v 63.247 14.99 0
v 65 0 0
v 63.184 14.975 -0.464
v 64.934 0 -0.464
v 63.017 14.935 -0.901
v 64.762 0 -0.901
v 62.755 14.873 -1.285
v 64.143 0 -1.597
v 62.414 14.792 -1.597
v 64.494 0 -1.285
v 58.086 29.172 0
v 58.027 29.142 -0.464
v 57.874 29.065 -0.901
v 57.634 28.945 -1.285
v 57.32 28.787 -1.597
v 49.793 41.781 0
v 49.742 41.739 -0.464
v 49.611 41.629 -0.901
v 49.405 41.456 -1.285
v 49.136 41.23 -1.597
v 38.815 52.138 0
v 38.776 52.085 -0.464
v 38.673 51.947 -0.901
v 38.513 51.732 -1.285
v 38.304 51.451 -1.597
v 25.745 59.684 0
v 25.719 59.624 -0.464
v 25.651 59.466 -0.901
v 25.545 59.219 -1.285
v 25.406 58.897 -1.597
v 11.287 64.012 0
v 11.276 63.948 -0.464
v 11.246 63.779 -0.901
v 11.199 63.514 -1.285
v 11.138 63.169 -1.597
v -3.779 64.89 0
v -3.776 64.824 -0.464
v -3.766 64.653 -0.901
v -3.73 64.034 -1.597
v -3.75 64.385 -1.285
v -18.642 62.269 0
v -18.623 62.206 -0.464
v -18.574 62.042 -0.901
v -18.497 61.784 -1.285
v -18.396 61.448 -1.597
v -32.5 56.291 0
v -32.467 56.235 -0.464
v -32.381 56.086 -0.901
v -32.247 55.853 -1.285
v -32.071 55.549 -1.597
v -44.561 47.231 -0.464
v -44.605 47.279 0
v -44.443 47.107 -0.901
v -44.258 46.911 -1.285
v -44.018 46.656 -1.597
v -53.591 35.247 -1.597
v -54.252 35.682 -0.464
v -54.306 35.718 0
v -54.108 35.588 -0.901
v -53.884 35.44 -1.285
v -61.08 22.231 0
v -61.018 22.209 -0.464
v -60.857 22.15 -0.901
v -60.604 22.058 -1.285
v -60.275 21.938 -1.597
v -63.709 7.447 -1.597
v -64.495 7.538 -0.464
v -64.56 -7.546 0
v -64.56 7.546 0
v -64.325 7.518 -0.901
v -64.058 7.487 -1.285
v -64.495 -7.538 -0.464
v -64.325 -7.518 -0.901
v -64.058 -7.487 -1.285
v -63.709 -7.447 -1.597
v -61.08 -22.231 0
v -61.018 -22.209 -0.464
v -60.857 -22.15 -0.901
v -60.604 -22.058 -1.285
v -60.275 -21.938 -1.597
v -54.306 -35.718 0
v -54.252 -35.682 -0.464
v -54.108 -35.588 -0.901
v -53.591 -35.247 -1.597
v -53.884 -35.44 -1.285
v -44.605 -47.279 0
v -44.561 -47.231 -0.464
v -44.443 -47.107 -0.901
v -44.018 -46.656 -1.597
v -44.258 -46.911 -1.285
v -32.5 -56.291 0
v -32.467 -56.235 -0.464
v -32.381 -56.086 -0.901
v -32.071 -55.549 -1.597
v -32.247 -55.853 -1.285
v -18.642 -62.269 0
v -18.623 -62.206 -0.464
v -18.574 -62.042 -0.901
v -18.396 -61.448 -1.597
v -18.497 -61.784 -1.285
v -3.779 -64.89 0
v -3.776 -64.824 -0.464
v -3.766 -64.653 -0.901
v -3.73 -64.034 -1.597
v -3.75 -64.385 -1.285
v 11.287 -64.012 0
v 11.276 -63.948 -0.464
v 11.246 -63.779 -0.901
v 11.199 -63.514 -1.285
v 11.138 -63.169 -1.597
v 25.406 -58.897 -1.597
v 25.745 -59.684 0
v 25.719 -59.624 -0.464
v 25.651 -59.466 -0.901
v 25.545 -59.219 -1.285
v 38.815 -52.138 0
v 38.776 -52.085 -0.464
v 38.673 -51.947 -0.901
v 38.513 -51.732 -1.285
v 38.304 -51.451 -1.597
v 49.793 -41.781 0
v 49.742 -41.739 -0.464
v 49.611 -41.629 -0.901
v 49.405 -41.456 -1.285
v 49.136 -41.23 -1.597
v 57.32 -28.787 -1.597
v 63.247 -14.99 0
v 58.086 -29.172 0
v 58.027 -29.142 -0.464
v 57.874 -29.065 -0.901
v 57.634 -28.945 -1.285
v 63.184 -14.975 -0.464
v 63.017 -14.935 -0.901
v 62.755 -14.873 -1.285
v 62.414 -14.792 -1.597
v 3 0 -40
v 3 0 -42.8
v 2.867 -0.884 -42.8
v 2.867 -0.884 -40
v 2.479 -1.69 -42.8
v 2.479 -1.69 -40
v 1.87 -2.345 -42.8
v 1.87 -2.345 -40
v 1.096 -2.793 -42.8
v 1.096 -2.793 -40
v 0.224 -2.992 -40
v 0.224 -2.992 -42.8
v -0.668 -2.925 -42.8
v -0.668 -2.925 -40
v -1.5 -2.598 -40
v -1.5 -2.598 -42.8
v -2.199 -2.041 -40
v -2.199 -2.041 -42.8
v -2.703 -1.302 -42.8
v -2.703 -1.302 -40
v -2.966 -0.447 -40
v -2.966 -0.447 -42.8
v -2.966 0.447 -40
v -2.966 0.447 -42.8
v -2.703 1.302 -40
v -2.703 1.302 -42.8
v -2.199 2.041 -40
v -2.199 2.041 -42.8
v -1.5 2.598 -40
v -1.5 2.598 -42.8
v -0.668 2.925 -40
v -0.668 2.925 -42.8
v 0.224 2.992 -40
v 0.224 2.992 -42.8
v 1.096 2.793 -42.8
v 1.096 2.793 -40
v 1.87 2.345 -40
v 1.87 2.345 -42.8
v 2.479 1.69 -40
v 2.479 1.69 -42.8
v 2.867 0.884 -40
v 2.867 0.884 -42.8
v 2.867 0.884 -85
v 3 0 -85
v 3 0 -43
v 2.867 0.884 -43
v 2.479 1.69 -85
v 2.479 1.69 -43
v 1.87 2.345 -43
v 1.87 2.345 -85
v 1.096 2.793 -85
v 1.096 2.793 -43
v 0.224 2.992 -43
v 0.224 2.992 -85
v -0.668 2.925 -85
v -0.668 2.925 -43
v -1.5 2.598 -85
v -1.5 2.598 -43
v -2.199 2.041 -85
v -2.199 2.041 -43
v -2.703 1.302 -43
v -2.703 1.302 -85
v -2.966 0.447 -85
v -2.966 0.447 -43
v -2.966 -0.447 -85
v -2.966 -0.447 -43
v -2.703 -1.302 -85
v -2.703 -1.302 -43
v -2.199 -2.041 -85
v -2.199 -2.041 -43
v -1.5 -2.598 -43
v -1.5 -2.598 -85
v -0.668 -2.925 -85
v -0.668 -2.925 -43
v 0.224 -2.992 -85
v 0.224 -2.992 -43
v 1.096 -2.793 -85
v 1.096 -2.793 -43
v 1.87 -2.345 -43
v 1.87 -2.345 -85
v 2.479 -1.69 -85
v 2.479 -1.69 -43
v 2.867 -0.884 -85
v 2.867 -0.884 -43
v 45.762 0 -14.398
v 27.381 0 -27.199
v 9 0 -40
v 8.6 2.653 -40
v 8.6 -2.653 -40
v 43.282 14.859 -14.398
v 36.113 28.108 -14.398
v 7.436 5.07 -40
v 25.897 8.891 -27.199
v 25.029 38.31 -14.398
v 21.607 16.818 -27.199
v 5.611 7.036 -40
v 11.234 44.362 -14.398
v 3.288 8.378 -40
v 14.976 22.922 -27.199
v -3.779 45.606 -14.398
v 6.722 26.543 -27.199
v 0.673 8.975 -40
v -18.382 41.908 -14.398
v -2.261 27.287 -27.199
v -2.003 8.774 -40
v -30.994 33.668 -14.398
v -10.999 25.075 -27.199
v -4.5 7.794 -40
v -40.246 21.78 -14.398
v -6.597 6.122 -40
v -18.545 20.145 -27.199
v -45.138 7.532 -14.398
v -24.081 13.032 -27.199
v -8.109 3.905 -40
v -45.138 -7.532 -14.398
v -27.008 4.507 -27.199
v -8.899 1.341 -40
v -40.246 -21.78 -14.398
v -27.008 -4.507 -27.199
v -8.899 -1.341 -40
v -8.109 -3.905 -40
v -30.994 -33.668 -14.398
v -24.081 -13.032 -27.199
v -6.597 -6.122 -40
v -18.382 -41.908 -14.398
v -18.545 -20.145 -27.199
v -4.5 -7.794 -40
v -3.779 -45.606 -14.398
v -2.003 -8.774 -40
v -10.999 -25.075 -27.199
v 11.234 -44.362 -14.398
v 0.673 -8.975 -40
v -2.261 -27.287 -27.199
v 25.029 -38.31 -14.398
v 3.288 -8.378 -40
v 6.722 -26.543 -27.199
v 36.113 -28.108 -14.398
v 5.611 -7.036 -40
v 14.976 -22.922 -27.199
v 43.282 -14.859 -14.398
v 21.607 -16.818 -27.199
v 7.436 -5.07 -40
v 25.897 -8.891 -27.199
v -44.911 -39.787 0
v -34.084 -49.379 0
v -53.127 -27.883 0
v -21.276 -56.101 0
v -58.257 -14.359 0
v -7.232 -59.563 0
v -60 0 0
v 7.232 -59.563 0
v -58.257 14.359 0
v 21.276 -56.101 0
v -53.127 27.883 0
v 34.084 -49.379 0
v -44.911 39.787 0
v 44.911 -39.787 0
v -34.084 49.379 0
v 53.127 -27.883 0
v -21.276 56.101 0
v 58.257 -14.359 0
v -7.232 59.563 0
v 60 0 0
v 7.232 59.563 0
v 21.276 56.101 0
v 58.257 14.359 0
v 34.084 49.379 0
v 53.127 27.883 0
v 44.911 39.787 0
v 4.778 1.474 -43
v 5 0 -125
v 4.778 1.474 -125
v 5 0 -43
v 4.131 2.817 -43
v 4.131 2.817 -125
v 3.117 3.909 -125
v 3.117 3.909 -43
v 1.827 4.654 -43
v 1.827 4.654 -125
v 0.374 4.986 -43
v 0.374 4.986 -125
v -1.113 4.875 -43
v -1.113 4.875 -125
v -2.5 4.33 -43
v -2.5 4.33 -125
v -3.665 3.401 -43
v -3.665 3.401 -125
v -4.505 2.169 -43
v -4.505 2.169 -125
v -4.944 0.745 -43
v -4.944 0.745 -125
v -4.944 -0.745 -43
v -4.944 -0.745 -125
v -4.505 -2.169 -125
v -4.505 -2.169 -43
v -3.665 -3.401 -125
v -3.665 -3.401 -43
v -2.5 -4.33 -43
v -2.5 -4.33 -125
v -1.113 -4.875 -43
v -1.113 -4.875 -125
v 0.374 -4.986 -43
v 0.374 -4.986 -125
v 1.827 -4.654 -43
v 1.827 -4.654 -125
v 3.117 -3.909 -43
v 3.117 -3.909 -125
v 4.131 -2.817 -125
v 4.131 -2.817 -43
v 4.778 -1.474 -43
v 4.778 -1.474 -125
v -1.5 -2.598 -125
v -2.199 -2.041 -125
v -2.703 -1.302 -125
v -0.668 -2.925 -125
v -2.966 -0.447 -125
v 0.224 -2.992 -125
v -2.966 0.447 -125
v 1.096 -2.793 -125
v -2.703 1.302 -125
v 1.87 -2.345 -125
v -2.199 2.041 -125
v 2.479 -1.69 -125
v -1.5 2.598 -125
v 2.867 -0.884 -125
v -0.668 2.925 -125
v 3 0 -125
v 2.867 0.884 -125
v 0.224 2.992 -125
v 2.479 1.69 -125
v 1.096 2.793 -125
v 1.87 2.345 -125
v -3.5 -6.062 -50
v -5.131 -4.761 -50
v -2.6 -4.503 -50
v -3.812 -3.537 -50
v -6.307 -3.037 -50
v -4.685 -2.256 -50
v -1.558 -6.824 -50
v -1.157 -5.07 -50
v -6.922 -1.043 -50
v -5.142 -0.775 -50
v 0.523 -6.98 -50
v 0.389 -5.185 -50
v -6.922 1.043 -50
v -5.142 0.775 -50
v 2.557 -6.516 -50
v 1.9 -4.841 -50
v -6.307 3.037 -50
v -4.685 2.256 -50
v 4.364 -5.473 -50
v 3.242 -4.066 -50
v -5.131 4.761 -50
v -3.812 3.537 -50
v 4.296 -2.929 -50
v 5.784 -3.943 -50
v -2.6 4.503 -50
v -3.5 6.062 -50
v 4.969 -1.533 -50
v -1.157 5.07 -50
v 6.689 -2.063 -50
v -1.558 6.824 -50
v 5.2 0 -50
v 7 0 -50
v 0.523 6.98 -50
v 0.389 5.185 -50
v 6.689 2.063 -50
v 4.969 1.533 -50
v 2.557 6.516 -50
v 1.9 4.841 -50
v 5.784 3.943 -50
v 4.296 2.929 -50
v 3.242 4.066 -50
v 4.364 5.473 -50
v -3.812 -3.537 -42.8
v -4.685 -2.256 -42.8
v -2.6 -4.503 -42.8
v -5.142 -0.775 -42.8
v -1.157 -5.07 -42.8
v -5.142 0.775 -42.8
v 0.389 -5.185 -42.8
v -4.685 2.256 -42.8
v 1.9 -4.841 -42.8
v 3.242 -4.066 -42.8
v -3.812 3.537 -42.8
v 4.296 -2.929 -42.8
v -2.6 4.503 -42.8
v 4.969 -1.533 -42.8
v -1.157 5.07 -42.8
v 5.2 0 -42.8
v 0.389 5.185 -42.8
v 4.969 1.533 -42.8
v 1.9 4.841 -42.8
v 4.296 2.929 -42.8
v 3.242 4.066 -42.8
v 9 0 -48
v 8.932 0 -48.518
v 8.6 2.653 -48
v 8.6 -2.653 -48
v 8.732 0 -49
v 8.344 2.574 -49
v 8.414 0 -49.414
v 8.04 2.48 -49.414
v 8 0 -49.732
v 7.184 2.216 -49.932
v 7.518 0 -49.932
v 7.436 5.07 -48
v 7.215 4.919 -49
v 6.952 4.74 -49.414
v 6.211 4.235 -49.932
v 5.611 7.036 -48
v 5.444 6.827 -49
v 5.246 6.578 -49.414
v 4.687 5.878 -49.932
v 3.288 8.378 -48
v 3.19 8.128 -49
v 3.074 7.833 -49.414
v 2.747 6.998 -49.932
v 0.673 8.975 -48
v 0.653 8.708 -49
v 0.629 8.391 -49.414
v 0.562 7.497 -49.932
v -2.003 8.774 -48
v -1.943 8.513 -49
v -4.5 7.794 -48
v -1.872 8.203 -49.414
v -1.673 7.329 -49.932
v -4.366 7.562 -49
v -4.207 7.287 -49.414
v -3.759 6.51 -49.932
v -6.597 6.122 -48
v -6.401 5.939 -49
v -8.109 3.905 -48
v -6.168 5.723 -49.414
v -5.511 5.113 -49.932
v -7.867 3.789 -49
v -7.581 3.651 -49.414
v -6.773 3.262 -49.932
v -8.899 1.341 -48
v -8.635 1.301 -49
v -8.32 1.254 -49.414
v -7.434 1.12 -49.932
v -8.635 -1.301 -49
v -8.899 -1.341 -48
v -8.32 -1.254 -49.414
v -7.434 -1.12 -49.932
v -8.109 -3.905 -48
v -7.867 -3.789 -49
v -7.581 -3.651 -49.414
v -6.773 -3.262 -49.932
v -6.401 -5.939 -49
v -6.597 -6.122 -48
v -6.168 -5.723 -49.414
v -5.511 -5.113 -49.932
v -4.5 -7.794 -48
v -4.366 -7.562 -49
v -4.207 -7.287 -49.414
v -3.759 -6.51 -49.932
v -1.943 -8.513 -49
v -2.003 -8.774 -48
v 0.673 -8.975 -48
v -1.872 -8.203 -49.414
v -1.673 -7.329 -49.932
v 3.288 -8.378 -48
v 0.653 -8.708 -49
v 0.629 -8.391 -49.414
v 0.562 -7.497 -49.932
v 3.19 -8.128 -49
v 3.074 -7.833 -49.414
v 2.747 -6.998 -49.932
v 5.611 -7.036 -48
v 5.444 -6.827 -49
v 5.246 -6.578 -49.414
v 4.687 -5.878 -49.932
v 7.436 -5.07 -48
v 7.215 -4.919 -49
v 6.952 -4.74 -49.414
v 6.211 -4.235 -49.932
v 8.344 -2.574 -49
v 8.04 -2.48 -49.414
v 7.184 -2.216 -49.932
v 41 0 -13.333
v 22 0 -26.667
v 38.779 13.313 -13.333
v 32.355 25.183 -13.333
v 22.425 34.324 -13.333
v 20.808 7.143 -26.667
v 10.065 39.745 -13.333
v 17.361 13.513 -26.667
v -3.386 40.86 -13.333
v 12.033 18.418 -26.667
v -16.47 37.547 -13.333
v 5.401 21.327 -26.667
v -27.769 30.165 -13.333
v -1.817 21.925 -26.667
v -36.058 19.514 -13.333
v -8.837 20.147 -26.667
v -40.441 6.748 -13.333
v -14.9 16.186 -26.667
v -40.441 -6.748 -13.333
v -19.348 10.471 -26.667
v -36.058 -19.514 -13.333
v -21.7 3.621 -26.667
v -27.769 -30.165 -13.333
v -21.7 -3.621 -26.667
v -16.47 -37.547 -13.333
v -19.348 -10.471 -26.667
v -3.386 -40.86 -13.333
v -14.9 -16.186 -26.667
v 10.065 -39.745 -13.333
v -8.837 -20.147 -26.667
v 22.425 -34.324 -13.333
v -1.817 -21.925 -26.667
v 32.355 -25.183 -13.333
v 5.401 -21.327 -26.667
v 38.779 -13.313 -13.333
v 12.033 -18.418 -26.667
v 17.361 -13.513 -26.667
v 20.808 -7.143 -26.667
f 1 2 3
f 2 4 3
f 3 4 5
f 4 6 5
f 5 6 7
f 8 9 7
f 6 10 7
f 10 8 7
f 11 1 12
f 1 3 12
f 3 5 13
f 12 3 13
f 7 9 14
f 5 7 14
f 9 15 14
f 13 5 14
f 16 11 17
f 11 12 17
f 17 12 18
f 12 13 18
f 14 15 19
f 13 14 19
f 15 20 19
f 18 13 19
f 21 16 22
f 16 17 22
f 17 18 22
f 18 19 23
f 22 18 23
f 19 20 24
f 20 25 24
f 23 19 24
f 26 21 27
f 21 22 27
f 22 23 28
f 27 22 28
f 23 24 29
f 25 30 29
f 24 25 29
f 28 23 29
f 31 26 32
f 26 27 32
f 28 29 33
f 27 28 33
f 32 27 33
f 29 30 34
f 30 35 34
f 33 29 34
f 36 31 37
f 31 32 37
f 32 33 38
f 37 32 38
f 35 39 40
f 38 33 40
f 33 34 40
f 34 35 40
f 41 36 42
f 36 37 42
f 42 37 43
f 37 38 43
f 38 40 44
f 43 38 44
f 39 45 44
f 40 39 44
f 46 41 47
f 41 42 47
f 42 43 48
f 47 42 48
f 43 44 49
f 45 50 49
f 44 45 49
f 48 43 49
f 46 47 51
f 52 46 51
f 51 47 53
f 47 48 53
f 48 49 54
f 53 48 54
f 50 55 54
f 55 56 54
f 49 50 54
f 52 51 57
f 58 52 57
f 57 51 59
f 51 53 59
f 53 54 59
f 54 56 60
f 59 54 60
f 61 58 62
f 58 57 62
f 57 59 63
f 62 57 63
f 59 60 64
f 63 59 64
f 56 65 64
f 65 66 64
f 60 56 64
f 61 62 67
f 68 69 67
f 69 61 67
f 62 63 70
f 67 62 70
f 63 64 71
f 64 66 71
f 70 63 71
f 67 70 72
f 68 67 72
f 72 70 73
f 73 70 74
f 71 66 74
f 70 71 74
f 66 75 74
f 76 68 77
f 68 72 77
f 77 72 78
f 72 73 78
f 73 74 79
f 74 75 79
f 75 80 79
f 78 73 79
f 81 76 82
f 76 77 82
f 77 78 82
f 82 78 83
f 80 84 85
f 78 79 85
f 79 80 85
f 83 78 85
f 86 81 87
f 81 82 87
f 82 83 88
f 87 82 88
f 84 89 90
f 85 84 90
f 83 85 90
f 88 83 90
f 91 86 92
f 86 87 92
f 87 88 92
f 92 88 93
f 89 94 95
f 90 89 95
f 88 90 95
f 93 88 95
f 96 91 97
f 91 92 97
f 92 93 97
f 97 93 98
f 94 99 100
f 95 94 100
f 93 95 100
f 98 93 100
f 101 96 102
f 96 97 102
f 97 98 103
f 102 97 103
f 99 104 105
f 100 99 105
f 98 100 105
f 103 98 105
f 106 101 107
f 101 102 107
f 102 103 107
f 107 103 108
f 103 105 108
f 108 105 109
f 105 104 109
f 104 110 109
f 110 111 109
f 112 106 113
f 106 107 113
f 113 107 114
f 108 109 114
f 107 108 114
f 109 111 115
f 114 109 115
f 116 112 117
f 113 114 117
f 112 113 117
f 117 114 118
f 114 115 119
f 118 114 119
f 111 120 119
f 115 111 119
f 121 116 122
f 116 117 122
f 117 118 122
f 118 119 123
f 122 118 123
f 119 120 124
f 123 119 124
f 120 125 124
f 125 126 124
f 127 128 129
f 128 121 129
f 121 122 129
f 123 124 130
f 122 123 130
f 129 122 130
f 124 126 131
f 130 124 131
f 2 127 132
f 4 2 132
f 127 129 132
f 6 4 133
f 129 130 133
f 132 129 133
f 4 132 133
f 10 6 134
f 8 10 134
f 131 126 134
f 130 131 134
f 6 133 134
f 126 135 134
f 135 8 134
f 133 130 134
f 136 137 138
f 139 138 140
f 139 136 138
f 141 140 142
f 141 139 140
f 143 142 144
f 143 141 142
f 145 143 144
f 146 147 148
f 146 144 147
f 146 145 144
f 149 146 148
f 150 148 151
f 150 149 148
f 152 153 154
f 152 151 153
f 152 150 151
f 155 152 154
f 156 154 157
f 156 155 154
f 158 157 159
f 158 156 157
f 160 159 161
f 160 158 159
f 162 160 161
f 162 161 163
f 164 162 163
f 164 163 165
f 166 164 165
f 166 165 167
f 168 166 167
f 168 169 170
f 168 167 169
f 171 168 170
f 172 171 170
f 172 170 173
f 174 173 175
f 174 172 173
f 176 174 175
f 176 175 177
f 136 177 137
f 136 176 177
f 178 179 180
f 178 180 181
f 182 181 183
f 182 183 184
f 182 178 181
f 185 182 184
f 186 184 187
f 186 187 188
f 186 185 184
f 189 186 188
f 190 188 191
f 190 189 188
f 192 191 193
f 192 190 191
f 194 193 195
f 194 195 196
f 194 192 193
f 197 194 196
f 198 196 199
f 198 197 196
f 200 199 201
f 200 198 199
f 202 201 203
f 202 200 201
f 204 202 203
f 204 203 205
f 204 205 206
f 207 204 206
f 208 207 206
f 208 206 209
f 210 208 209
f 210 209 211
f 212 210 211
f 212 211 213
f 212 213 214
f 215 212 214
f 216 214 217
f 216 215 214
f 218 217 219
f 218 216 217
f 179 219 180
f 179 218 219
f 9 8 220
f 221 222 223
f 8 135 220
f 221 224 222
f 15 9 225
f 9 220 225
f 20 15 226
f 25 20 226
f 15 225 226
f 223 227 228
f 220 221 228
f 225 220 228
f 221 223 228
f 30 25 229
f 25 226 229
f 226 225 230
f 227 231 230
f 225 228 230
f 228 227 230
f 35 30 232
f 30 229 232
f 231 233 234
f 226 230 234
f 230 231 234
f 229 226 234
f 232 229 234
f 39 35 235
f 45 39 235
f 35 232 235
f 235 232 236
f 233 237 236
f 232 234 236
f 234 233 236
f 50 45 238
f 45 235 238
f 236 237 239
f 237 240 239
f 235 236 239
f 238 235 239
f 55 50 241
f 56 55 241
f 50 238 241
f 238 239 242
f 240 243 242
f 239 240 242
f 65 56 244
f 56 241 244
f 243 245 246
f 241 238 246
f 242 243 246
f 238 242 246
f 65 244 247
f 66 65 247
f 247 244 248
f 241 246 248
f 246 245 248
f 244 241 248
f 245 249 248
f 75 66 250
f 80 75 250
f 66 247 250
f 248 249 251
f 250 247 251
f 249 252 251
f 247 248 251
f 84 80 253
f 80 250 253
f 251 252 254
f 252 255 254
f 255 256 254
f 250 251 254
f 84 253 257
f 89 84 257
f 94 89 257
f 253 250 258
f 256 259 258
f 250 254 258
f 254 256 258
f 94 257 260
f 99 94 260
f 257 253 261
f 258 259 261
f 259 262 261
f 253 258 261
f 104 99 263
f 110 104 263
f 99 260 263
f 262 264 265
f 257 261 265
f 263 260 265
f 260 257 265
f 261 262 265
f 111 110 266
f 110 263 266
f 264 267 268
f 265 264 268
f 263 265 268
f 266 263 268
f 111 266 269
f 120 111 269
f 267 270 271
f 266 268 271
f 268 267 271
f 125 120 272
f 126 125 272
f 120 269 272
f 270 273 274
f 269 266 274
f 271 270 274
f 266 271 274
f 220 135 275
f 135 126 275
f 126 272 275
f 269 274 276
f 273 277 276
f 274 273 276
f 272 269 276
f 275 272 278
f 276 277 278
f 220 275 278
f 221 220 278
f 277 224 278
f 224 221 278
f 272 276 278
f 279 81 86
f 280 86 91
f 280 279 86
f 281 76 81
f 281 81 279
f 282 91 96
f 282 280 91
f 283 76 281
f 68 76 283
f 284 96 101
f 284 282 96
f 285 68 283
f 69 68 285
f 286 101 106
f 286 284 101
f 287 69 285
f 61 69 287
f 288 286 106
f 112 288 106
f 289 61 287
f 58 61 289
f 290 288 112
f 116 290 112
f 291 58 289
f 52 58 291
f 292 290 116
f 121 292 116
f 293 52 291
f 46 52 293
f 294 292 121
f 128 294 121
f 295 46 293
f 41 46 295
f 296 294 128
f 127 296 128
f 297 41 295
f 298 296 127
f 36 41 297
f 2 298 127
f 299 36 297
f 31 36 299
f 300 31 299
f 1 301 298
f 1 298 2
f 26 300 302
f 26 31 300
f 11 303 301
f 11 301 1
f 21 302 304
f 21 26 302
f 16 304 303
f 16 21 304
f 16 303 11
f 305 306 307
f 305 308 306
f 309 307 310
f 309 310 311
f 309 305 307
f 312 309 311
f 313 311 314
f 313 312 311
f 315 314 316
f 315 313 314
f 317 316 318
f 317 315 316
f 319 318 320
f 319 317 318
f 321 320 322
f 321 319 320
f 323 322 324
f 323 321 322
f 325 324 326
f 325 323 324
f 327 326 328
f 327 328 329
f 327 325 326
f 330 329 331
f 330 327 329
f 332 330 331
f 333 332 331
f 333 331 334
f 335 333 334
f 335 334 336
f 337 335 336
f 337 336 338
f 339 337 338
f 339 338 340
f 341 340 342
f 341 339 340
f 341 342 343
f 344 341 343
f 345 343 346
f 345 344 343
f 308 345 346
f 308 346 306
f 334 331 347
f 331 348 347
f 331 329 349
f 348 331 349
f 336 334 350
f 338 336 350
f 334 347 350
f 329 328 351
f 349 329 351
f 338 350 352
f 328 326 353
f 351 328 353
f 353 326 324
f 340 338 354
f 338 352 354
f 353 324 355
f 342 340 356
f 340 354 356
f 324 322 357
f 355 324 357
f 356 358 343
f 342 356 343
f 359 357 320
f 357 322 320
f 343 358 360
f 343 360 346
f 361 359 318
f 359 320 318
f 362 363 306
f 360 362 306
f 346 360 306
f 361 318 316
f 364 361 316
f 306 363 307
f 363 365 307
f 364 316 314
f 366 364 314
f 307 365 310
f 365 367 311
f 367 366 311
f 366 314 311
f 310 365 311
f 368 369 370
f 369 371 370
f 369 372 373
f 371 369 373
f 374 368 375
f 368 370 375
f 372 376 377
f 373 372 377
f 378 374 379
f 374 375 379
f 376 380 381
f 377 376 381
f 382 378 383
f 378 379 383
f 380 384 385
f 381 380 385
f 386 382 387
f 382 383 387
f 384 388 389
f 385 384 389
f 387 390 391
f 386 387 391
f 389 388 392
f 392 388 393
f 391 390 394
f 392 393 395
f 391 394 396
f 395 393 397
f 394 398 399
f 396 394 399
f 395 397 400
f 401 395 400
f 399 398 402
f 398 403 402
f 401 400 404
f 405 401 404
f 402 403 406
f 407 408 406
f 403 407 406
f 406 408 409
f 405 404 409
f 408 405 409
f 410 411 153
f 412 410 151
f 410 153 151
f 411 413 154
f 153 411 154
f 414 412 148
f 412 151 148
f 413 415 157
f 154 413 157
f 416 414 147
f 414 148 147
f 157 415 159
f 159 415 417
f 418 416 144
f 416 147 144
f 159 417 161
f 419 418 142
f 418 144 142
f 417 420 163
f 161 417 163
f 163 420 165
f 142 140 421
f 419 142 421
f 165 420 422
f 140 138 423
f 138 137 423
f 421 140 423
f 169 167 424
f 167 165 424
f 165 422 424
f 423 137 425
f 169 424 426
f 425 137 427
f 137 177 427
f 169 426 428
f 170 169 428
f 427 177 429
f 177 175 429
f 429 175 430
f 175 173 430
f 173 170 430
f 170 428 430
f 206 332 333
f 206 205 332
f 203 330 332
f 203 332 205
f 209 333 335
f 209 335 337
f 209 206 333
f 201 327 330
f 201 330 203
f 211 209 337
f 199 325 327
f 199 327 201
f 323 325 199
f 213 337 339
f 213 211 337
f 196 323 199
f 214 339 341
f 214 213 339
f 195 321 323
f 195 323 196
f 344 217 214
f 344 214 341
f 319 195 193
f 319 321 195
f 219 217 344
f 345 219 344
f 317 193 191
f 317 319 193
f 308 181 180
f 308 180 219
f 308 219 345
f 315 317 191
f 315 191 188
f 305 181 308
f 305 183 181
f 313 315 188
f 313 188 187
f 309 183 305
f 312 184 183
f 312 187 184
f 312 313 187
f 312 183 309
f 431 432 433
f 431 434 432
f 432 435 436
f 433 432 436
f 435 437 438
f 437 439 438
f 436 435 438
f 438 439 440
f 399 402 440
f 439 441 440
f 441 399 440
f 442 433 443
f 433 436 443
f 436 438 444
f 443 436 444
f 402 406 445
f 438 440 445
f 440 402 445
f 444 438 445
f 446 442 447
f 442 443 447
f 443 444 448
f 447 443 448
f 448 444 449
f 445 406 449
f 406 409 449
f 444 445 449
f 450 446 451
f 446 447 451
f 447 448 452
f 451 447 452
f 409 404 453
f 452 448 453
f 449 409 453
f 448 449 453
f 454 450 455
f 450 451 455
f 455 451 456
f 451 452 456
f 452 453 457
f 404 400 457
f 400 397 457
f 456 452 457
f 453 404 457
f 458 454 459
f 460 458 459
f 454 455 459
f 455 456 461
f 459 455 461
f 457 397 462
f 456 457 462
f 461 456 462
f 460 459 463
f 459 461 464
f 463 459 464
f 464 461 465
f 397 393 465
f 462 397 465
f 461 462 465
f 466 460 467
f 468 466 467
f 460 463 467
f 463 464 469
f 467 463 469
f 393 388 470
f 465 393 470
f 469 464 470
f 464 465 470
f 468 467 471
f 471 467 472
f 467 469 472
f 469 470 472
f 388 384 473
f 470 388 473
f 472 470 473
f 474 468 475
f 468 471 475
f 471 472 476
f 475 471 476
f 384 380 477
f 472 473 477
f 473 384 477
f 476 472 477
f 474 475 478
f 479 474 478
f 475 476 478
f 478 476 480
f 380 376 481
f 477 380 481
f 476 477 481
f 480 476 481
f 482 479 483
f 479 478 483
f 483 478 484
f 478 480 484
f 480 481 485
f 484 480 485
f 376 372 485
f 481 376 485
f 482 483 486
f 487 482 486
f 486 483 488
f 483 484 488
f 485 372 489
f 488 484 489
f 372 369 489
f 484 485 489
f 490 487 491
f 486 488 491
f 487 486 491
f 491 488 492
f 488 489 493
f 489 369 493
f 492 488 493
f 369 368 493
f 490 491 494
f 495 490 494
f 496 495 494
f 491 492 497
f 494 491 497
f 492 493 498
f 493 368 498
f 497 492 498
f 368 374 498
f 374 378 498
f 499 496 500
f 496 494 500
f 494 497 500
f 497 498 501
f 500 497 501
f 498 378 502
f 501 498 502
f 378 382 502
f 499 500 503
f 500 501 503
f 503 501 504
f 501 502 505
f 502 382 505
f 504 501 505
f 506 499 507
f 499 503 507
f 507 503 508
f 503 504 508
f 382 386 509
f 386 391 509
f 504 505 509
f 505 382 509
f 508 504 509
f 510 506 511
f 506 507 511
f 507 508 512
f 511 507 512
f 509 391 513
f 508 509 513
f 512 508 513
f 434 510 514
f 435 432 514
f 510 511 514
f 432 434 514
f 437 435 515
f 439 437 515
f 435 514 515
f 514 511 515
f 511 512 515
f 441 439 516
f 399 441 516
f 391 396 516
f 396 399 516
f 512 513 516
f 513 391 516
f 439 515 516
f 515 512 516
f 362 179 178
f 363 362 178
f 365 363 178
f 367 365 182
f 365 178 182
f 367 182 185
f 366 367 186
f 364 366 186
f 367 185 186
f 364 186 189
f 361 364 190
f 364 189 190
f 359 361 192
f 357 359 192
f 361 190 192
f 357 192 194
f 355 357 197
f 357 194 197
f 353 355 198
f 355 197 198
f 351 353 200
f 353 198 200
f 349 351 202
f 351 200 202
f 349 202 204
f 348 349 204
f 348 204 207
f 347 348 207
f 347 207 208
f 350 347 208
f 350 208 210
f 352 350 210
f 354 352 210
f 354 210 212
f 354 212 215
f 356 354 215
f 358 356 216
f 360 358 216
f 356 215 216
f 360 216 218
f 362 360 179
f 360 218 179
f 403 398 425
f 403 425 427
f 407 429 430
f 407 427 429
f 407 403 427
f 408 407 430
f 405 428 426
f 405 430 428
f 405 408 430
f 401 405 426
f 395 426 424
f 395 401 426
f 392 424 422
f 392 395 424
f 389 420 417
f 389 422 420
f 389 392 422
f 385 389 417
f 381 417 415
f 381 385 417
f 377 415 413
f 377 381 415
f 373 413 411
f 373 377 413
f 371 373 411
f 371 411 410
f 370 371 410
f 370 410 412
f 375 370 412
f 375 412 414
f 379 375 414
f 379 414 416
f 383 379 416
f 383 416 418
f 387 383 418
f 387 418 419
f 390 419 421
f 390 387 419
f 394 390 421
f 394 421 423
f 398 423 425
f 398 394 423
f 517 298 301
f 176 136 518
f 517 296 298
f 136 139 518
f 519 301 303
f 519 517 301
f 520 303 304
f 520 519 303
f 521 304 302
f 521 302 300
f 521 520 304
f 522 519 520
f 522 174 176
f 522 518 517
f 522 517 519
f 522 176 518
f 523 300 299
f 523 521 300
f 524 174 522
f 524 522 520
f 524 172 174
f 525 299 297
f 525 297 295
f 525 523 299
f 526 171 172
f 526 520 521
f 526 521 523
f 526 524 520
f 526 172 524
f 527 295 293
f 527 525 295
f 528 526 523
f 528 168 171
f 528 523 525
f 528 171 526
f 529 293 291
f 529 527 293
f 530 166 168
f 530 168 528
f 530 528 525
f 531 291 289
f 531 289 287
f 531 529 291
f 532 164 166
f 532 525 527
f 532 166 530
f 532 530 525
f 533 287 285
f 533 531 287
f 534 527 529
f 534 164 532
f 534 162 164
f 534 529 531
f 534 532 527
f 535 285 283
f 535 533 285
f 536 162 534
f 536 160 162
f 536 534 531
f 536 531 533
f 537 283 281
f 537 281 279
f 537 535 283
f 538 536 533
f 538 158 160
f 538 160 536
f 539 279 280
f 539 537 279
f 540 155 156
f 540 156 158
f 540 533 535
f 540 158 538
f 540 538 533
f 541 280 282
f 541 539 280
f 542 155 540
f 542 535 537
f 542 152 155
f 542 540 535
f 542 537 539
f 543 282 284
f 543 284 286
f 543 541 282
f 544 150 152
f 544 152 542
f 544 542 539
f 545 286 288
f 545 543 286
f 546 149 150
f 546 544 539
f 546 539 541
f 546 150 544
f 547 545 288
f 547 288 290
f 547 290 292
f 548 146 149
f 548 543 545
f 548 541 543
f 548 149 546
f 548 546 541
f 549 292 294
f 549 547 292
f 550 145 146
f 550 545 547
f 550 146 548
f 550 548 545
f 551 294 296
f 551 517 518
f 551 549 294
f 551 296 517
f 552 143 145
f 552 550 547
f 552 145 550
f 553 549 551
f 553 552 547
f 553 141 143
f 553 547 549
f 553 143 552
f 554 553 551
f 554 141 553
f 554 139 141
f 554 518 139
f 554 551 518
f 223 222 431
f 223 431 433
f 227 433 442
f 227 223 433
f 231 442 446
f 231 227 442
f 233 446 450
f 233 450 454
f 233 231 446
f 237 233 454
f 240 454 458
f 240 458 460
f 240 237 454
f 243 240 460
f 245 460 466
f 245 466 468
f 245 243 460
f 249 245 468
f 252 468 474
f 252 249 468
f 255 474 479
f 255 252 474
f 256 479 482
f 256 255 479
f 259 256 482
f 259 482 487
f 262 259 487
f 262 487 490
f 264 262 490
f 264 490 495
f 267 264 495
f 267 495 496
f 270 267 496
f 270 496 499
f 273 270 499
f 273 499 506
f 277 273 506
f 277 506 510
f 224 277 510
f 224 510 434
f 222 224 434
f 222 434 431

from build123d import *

# Parameters (mm, degrees)
F0_R       = 65
F0_R_2     = 60
F1_DEPTH   = 40
F2_R       = 3
F4_SIZE2   = 56
F4_SIZE    = 39
F5_DEPTH   = 10
F8_R       = 5
F8_R_2     = 3
F9_DEPTH   = 42
F10_OFFSET = 0.2
F11_DEPTH  = 40


# Not quite as in the source:
# - a fillet or chamfer that OpenCascade refuses, or shapes differently, is made with other operations: its cross-section is extruded or revolved along the edge and cut away or added


with BuildPart() as f1:
    # F0 (on Top) → F1 (new body)
    with BuildSketch(Plane.XY):
        Circle(F0_R)
        Circle(F0_R_2, mode=Mode.SUBTRACT)
        Circle(F0_R_2)
    extrude(amount=-F1_DEPTH)

    # F0 (on Top) → F3 section 0
    with BuildSketch(Plane.XY):
        Circle(F0_R_2)
    # F2 (on face) → F3 section 1
    with BuildSketch(Plane(origin=(0, 0, -40), x_dir=(1, 0, 0), z_dir=(0, 0, -1))):
        Circle(F2_R)
    loft(mode=Mode.SUBTRACT)

    # F4
    f4_edges = [f1.edges().sort_by_distance(p)[0] for p in [
        (-65, 0, -40),
    ]]
    f4_side = f1.faces().sort_by_distance((-65, 0, -20))[0]
    chamfer(f4_edges, length=F4_SIZE, length2=F4_SIZE2, reference=f4_side)

    # F5 (add): a face of the model
    f5_faces = [f1.faces().sort_by_distance(p)[0] for p in [
        (-8.7454415588, 0, -40),
    ]]
    extrude(f5_faces, amount=F5_DEPTH)

    # F6: fillet of radius 2 on 2 edges, made by hand

    # F6_s1 → F6_t2 (revolve, cut)
    with BuildSketch(Plane.XZ):
        with BuildLine():
            ThreePointArc((65, 0.0443648455), (64.7728472883, -0.8813848467), (64.1429875075, -1.5968479858))
            Line((64.1429875075, -1.5968479858), (65, -1))
            Line((65, -1), (65, 0.0443648455))
        make_face()
    revolve(axis=Axis((0, 0, -1), (0, 0, 1)), mode=Mode.SUBTRACT)

    # F6_s3 → F6_t4 (revolve, cut)
    with BuildSketch(Plane.XZ):
        with BuildLine():
            ThreePointArc((9, -48), (8.4142135624, -49.4142135624), (7, -50))
            Line((7, -50), (9, -50))
            Line((9, -50), (9, -48))
        make_face()
    revolve(axis=Axis((0, 0, -50), (0, 0, 1)), mode=Mode.SUBTRACT)


with BuildPart() as f9:
    # F8 (on offset) → F9 (new body)
    with BuildSketch(Plane.XY.offset(-85)):
        Circle(F8_R)
        Circle(F8_R_2, mode=Mode.SUBTRACT)
    extrude(amount=F9_DEPTH)


with BuildPart() as f1_1:
    add(f1.part)

    # F10: cut F9, made larger all round first
    f10_tool = offset(f9.part, amount=F10_OFFSET, kind=Kind.INTERSECTION, mode=Mode.PRIVATE)
    add(f10_tool, mode=Mode.SUBTRACT)


with BuildPart() as f9_1:
    add(f9.part)

    # F11 (add): a face of the model
    f11_faces = [f9_1.faces().sort_by_distance(p)[0] for p in [
        (-4.8585786438, 0, -85),
    ]]
    extrude(f11_faces, amount=F11_DEPTH)


solid = Compound([f1_1.part, f9_1.part])
